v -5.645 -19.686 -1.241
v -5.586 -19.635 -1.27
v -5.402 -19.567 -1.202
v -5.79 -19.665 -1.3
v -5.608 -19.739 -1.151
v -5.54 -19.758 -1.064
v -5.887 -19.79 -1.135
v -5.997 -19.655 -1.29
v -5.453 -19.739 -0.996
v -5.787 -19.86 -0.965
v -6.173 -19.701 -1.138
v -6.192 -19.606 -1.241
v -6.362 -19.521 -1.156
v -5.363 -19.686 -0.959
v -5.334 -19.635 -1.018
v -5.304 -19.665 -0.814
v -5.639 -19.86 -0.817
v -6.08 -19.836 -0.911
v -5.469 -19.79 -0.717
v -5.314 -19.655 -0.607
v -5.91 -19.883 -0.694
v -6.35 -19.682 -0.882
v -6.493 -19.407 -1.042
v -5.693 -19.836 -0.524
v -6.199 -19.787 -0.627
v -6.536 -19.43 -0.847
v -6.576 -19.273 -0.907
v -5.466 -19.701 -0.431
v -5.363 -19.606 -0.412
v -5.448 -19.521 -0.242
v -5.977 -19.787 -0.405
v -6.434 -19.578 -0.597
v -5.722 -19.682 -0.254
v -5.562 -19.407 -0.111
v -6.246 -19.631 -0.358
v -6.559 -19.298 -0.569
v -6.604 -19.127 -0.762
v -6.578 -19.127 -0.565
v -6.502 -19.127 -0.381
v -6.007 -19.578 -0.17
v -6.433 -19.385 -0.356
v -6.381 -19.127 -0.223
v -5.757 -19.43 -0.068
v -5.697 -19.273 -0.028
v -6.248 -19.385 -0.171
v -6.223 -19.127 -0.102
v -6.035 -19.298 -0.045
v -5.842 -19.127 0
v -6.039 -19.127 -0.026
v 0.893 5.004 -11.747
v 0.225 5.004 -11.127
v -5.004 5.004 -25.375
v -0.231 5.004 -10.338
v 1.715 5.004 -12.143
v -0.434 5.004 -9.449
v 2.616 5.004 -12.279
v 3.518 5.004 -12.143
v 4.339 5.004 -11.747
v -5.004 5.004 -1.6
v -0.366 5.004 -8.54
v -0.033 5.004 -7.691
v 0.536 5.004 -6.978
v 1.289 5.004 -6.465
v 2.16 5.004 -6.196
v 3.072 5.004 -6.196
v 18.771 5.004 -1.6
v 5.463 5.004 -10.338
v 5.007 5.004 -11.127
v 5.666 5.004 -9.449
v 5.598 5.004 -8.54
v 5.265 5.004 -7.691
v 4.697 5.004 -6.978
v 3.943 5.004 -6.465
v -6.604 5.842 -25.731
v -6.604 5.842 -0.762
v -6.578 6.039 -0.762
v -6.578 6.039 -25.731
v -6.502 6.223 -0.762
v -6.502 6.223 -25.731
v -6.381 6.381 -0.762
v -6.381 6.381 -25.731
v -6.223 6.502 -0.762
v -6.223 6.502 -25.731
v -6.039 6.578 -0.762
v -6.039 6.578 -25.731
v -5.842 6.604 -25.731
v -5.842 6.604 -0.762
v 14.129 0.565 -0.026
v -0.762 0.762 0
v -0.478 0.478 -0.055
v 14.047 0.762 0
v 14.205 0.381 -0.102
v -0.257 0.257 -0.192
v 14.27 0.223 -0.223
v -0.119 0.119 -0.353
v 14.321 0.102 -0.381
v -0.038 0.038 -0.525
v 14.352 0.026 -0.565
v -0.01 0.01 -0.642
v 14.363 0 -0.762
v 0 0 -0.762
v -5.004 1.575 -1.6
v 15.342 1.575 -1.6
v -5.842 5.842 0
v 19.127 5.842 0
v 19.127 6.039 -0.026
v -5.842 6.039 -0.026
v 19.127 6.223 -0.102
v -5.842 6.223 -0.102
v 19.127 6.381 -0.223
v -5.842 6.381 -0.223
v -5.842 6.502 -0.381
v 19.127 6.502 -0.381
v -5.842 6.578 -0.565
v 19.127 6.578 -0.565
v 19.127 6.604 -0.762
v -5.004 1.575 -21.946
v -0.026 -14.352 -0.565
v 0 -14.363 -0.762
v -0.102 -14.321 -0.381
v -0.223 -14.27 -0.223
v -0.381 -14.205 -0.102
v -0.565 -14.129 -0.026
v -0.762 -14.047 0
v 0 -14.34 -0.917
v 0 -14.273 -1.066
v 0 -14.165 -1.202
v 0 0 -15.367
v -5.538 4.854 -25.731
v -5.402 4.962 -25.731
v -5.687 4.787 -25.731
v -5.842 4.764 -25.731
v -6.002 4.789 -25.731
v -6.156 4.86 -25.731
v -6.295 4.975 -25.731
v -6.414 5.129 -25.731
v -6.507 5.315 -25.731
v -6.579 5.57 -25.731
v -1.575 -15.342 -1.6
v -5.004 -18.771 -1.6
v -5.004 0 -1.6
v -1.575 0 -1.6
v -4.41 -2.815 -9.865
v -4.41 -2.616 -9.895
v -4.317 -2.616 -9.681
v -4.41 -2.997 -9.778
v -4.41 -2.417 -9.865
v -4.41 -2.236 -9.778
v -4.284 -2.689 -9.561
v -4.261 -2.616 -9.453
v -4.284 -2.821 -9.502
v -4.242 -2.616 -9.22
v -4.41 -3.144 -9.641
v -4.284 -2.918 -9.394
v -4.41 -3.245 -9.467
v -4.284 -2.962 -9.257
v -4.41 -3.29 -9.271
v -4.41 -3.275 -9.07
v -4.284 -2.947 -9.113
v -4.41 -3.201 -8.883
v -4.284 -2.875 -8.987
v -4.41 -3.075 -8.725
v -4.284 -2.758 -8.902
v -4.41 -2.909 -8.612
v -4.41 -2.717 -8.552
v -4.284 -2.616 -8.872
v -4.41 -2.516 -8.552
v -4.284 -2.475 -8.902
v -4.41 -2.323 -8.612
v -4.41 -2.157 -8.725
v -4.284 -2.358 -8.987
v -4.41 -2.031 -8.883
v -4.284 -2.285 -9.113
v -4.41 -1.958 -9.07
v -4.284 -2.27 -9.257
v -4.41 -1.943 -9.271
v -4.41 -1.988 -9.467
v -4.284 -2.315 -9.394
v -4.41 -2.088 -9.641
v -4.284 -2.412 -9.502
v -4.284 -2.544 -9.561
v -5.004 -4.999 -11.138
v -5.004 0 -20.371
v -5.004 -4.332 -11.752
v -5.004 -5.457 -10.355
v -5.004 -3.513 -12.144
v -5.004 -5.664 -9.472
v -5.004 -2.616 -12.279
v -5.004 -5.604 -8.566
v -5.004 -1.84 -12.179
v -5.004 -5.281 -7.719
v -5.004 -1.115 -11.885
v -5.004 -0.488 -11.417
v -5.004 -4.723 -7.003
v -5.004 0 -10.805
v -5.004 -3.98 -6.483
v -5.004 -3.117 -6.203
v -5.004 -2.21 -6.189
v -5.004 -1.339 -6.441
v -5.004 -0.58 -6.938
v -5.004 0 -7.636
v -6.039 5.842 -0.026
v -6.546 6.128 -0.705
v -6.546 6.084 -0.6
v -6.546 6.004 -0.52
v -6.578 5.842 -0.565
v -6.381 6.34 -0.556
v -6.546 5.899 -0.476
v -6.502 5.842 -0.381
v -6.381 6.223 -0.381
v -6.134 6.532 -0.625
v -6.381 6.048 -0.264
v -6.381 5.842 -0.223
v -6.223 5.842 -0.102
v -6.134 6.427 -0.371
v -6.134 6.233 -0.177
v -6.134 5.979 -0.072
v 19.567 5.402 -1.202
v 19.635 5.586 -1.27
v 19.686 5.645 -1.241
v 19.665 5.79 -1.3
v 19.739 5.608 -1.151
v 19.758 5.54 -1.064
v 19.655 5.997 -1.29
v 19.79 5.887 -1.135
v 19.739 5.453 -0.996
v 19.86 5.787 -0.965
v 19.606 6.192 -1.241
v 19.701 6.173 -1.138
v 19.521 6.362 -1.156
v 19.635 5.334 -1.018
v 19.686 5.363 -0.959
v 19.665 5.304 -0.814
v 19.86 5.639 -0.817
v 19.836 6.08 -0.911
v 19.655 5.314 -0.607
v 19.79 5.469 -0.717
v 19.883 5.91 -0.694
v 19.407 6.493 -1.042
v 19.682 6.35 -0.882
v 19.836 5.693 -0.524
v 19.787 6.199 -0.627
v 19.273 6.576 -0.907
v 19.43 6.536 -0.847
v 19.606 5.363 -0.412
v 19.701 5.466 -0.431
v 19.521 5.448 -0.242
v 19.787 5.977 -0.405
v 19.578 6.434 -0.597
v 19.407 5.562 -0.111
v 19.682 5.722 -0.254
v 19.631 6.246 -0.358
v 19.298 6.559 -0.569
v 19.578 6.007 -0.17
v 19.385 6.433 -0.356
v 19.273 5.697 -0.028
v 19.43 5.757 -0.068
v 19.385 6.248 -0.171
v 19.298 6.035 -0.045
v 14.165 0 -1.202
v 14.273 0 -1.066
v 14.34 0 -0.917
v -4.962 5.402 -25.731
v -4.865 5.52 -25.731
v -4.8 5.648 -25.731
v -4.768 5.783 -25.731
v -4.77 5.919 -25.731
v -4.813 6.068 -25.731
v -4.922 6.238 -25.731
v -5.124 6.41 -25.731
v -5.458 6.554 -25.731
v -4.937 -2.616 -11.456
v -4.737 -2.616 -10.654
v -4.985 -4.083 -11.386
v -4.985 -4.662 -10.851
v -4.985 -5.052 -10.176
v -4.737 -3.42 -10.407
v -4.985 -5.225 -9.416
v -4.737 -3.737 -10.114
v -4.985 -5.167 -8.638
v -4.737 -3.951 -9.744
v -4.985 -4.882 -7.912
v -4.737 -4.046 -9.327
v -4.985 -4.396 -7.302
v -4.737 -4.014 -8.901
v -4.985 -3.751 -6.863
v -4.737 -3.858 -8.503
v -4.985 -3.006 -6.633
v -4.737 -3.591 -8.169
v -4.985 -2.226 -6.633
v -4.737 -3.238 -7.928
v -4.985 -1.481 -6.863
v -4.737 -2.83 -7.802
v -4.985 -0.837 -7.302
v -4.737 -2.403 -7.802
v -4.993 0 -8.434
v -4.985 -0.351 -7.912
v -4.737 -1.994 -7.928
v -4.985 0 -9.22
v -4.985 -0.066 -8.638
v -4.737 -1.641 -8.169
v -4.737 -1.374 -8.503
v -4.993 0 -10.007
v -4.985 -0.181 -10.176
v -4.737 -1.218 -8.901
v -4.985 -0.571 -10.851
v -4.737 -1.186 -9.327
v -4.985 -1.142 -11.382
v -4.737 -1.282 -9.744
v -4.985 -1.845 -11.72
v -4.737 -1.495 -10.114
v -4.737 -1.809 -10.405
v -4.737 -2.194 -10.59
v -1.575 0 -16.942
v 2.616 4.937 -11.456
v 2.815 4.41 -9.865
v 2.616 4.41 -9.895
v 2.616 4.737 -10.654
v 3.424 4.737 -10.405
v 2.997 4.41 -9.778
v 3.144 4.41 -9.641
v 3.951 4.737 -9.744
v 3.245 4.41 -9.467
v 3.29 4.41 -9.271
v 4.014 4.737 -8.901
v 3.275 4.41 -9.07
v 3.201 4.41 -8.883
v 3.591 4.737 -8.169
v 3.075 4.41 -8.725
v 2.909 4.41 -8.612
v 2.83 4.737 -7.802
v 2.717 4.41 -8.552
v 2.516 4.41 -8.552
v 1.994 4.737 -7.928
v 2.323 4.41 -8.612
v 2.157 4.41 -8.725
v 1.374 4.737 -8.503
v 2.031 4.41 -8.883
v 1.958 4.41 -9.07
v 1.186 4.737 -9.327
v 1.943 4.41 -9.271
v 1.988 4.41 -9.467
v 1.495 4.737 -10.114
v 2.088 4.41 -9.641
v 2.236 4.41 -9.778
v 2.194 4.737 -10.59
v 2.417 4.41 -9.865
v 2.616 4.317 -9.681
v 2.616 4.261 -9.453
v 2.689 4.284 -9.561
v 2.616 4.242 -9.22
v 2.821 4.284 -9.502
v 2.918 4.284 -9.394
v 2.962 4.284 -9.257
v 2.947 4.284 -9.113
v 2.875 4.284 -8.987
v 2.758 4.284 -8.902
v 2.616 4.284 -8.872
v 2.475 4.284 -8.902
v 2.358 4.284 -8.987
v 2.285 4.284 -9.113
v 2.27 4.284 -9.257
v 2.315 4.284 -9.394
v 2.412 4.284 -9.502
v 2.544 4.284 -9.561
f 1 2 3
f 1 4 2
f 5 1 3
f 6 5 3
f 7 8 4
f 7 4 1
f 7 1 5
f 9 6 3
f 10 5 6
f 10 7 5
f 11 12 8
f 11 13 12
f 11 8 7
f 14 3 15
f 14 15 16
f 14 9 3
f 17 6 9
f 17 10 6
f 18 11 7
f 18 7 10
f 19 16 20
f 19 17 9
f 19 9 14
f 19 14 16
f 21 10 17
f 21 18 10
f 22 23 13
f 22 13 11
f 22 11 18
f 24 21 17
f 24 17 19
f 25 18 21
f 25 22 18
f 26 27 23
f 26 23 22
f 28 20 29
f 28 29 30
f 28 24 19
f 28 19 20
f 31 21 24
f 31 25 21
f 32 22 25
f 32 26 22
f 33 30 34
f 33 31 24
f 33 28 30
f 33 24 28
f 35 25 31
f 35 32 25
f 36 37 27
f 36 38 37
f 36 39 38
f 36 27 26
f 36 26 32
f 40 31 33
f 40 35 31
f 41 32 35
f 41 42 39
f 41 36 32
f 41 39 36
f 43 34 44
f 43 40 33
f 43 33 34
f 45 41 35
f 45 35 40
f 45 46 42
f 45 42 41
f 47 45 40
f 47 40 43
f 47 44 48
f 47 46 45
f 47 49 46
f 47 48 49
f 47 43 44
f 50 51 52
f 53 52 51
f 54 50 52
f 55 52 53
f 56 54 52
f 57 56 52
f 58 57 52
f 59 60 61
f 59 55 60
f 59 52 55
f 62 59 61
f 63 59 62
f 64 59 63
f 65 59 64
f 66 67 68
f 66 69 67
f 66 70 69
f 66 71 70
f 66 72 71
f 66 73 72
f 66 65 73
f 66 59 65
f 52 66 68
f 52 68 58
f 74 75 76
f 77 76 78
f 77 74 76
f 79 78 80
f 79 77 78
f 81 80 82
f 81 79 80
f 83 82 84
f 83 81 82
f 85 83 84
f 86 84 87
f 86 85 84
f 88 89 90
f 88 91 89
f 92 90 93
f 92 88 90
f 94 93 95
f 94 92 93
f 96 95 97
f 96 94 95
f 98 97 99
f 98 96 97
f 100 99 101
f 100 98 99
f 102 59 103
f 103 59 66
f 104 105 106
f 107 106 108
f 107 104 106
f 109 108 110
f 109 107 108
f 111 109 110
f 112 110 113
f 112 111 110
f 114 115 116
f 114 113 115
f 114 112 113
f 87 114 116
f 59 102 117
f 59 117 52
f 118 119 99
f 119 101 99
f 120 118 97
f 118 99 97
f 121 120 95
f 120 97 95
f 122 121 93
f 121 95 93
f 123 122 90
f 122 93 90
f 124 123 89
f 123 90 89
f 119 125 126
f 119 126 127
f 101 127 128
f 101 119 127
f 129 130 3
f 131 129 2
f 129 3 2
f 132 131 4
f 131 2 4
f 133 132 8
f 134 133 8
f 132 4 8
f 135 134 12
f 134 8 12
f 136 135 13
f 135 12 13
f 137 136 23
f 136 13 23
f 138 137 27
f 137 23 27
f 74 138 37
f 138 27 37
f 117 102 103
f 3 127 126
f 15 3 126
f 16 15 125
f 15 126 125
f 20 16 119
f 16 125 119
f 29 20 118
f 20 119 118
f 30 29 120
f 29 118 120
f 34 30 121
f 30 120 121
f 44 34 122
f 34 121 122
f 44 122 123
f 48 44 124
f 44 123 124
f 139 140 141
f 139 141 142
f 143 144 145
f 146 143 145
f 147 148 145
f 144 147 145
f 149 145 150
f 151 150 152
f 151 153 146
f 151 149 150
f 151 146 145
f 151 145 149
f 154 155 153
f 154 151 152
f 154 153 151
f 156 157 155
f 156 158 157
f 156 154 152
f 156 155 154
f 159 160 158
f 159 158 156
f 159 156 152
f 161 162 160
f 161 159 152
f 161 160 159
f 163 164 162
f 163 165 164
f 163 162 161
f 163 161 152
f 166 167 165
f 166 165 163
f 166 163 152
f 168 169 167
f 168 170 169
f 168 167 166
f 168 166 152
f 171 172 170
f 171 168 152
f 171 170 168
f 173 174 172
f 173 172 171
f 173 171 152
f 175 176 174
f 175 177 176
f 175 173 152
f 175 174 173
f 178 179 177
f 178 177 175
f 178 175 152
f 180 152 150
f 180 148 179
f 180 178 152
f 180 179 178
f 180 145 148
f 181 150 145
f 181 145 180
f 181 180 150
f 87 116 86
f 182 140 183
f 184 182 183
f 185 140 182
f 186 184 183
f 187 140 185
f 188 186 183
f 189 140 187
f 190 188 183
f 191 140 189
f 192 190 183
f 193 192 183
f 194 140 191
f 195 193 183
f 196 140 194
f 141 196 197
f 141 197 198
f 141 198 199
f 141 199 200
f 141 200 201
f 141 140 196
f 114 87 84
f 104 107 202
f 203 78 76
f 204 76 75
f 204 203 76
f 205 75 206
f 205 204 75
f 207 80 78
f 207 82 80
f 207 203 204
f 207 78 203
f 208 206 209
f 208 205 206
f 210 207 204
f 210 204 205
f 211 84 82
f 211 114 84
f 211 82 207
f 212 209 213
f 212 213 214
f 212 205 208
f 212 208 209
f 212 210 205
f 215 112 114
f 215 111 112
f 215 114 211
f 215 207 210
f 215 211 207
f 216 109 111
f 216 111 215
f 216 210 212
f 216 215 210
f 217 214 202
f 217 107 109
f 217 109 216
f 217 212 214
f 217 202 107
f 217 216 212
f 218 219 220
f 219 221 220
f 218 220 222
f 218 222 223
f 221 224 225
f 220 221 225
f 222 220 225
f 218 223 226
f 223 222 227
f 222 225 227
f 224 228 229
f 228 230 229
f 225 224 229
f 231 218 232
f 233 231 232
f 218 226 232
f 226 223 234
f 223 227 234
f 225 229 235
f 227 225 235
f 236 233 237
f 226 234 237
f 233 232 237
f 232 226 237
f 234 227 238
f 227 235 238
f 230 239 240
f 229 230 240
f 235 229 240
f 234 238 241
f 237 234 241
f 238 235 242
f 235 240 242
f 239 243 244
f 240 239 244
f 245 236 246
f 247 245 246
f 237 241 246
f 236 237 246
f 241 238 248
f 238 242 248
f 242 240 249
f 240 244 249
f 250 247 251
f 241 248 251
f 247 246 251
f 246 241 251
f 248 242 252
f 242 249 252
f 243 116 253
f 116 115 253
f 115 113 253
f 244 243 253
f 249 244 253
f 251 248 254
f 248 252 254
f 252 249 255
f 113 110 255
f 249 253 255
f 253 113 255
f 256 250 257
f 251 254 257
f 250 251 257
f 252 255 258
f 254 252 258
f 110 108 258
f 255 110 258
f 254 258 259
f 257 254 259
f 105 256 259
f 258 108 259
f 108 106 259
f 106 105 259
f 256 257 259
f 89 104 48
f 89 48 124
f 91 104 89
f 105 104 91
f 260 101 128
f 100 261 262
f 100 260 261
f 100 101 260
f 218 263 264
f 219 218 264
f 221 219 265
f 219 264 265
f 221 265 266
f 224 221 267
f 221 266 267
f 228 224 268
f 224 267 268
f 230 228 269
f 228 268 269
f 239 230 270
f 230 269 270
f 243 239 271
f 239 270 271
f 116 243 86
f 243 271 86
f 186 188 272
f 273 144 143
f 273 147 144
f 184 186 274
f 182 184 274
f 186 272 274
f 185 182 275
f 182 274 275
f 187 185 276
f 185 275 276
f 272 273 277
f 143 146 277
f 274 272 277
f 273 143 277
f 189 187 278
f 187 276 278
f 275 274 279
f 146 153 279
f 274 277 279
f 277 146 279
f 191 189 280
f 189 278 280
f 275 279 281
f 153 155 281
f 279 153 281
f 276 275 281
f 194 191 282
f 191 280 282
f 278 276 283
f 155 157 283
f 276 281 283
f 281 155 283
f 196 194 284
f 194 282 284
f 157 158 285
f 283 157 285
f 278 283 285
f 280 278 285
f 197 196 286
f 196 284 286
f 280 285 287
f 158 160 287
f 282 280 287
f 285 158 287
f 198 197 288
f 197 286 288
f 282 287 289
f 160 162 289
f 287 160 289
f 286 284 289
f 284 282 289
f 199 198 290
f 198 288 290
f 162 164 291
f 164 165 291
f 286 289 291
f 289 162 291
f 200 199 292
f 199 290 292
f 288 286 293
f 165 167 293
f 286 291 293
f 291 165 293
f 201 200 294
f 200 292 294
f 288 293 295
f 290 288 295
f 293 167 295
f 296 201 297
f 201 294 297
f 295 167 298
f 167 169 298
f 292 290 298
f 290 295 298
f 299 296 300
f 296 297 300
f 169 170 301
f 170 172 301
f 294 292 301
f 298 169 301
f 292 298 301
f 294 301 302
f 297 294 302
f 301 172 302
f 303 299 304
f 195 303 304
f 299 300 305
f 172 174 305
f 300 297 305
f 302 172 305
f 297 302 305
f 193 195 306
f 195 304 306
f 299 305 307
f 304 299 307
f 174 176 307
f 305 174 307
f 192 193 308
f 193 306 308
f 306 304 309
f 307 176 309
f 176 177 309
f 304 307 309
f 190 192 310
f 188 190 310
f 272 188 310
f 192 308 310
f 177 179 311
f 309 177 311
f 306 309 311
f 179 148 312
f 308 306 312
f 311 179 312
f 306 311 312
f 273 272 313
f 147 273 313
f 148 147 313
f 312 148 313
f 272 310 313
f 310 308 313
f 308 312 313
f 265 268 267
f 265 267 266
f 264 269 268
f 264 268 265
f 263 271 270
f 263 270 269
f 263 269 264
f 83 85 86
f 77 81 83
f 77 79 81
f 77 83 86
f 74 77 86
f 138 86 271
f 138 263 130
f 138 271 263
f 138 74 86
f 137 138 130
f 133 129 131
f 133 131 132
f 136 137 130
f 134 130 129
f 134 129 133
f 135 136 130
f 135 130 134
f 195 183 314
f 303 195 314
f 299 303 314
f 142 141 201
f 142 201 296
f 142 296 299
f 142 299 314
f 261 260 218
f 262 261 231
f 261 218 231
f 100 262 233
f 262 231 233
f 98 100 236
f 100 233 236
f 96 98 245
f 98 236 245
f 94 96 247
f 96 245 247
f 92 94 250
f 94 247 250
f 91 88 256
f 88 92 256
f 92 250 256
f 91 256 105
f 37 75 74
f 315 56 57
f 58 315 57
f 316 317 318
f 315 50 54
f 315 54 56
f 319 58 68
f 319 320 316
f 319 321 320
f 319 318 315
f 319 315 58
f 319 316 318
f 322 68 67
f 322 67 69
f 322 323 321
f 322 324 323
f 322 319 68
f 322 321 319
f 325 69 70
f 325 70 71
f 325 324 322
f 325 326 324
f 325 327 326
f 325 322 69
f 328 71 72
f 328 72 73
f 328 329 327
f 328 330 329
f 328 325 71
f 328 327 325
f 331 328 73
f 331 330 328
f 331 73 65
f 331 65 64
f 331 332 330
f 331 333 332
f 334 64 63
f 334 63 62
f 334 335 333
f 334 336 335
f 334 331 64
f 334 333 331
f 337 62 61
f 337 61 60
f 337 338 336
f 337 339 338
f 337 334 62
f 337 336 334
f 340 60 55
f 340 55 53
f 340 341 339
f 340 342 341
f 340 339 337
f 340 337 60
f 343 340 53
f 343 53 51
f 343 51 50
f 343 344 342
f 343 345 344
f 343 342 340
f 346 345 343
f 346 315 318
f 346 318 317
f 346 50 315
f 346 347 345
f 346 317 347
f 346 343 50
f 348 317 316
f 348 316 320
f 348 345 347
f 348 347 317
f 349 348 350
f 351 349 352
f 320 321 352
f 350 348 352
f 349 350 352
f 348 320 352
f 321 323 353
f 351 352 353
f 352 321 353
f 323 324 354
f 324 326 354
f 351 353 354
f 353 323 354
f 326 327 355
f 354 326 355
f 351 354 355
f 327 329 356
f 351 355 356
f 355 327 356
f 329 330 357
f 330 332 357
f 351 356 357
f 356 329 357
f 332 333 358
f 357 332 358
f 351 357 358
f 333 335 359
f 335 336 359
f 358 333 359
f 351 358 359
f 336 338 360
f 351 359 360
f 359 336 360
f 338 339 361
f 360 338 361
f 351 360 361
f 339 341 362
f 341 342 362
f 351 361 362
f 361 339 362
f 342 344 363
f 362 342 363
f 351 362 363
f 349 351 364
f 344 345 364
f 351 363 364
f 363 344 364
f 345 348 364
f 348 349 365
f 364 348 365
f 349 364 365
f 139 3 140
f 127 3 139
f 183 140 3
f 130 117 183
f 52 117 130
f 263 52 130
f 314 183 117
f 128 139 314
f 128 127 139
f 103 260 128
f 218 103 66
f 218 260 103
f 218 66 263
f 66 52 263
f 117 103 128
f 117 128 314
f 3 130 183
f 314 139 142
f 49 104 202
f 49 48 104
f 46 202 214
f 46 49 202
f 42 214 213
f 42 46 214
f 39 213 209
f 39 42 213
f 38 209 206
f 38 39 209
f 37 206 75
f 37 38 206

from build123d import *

# Parameters (mm, degrees)
F1_DEPTH  = 28.575
F3_R      = 38.1
F4_DEPTH  = 32.9965678842
F6_W      = 26.9748
F6_H      = 3.429
F6_W_2    = 3.429
F6_H_2    = 21.971
F7_DEPTH  = 26.9758
F14_R     = 0.762
F15_W     = 1.8396307345
F15_H     = 3.0181135691
F16_DEPTH = 26.4941772846


# Not quite as in the source:
# - a fillet or chamfer that OpenCascade refuses, or shapes differently, is made with other operations: its cross-section is extruded or revolved along the edge and cut away or added
# - a pattern or mirror of a feature is missing from the dataset's text; its kind, count and spacing are read off the source's solid


with BuildPart() as f1:
    # F0 (on Top) → F1 (new body)
    with BuildSketch(Plane.XY):
        Polygon((0, -21.971), (0, 0), (21.971, 0), (21.971, 6.604), (-6.604, 6.604), (-6.604, -21.971), align=None)
    extrude(amount=-F1_DEPTH)

    # F3 (on 3pt) → F4 (cut, through all)
    with BuildSketch(Plane(origin=(5.1223333333, -5.1223333333, -5.1223333333), x_dir=(0.4082482905, 0.8164965809, -0.4082482905), z_dir=(0.5773502692, -0.5773502692, -0.5773502692))):
        Circle(F3_R)
    extrude(amount=F4_DEPTH, mode=Mode.SUBTRACT)

    # F6 (on offset) → F7 (cut, through all)
    with BuildSketch(Plane.XY.offset(-1.6002)):
        with Locations((8.4836, 3.2893)):
            Rectangle(F6_W, F6_H)
        with Locations((-3.2893, -10.9855)):
            Rectangle(F6_W_2, F6_H_2)
    extrude(amount=-F7_DEPTH, mode=Mode.SUBTRACT)

    # F9 (on offset) → F10 (revolve)
    with BuildSketch(Plane.YZ.offset(2.6162)):
        with BuildLine():
            ThreePointArc((4.2418, -9.2202), (4.4469151823, -9.9607308906), (5.0038, -10.4902))
            Line((5.0038, -10.4902), (5.0038, -9.2202))
            Line((5.0038, -9.2202), (4.2418, -9.2202))
        make_face()
    f10 = revolve(axis=Axis((2.6162, 4.6228, -9.2202), (0, -1, 0)))

    # F10_copies: F10 across plane
    add(f10.mirror(Plane(origin=(0, 0, 0), x_dir=(0.7071067796, -0.7071067828, 0), z_dir=(-0.7071067828, -0.7071067796, 0))))

    # F13: fillet of radius 5.08 on 3 edges, made by hand

    # F13_s1 → F13_t2 (revolve)
    with BuildSketch(Plane.YZ.offset(2.6162)):
        with BuildLine():
            ThreePointArc((5.0038, -12.278765023), (4.853123865, -11.0506908258), (4.4100337662, -9.8954676025))
            ThreePointArc((4.4100337662, -9.8954676025), (4.662543942, -10.2371346569), (5.0038, -10.4902))
            Line((5.0038, -10.4902), (5.0038, -12.278765023))
        make_face()
    revolve(axis=Axis((2.6162, 5.0038, -9.2202), (0, -1, 0)))

    # F13_s3 → F13_t4 (revolve)
    with BuildSketch(Plane.XZ.offset(2.6161999777)):
        with BuildLine():
            ThreePointArc((-5.0038, -12.2787650011), (-4.8531238674, -11.0506908133), (-4.4100337753, -9.8954675976))
            ThreePointArc((-4.4100337753, -9.8954675976), (-4.6625439517, -10.237134655), (-5.0038000116, -10.4902))
            Line((-5.0038000116, -10.4902), (-5.0038, -12.2787650011))
        make_face()
    revolve(axis=Axis((-5.0038000116, -2.6161999777, -9.2202), (-1, 4.4e-09, 0)))

    # F14
    f14_edges = [f1.edges().sort_by_distance(p)[0] for p in [
        (7.6835, 6.604, 0),
        (-6.604, 6.604, -14.2875),
        (7.6835, 6.604, -14.2875),
        (-6.604, -7.6835, 0),
        (-6.604, -7.6835, -14.2875),
        (18.669, 3.302, 0),
        (7.6835, 0, 0),
        (0, -7.6835, 0),
        (-3.302, -18.669, 0),
    ]]
    fillet(f14_edges, radius=F14_R)

    # F15 (on face) → F16 (cut, through all)
    with BuildSketch(Plane(origin=(-6.604, 0, 0), x_dir=(0, -1, 0), z_dir=(-1, 0, 0))):
        with Locations((-5.6841846327, -27.2402340692)):
            Rectangle(F15_W, F15_H)
    extrude(amount=-F16_DEPTH, mode=Mode.SUBTRACT)


solid = f1.part
